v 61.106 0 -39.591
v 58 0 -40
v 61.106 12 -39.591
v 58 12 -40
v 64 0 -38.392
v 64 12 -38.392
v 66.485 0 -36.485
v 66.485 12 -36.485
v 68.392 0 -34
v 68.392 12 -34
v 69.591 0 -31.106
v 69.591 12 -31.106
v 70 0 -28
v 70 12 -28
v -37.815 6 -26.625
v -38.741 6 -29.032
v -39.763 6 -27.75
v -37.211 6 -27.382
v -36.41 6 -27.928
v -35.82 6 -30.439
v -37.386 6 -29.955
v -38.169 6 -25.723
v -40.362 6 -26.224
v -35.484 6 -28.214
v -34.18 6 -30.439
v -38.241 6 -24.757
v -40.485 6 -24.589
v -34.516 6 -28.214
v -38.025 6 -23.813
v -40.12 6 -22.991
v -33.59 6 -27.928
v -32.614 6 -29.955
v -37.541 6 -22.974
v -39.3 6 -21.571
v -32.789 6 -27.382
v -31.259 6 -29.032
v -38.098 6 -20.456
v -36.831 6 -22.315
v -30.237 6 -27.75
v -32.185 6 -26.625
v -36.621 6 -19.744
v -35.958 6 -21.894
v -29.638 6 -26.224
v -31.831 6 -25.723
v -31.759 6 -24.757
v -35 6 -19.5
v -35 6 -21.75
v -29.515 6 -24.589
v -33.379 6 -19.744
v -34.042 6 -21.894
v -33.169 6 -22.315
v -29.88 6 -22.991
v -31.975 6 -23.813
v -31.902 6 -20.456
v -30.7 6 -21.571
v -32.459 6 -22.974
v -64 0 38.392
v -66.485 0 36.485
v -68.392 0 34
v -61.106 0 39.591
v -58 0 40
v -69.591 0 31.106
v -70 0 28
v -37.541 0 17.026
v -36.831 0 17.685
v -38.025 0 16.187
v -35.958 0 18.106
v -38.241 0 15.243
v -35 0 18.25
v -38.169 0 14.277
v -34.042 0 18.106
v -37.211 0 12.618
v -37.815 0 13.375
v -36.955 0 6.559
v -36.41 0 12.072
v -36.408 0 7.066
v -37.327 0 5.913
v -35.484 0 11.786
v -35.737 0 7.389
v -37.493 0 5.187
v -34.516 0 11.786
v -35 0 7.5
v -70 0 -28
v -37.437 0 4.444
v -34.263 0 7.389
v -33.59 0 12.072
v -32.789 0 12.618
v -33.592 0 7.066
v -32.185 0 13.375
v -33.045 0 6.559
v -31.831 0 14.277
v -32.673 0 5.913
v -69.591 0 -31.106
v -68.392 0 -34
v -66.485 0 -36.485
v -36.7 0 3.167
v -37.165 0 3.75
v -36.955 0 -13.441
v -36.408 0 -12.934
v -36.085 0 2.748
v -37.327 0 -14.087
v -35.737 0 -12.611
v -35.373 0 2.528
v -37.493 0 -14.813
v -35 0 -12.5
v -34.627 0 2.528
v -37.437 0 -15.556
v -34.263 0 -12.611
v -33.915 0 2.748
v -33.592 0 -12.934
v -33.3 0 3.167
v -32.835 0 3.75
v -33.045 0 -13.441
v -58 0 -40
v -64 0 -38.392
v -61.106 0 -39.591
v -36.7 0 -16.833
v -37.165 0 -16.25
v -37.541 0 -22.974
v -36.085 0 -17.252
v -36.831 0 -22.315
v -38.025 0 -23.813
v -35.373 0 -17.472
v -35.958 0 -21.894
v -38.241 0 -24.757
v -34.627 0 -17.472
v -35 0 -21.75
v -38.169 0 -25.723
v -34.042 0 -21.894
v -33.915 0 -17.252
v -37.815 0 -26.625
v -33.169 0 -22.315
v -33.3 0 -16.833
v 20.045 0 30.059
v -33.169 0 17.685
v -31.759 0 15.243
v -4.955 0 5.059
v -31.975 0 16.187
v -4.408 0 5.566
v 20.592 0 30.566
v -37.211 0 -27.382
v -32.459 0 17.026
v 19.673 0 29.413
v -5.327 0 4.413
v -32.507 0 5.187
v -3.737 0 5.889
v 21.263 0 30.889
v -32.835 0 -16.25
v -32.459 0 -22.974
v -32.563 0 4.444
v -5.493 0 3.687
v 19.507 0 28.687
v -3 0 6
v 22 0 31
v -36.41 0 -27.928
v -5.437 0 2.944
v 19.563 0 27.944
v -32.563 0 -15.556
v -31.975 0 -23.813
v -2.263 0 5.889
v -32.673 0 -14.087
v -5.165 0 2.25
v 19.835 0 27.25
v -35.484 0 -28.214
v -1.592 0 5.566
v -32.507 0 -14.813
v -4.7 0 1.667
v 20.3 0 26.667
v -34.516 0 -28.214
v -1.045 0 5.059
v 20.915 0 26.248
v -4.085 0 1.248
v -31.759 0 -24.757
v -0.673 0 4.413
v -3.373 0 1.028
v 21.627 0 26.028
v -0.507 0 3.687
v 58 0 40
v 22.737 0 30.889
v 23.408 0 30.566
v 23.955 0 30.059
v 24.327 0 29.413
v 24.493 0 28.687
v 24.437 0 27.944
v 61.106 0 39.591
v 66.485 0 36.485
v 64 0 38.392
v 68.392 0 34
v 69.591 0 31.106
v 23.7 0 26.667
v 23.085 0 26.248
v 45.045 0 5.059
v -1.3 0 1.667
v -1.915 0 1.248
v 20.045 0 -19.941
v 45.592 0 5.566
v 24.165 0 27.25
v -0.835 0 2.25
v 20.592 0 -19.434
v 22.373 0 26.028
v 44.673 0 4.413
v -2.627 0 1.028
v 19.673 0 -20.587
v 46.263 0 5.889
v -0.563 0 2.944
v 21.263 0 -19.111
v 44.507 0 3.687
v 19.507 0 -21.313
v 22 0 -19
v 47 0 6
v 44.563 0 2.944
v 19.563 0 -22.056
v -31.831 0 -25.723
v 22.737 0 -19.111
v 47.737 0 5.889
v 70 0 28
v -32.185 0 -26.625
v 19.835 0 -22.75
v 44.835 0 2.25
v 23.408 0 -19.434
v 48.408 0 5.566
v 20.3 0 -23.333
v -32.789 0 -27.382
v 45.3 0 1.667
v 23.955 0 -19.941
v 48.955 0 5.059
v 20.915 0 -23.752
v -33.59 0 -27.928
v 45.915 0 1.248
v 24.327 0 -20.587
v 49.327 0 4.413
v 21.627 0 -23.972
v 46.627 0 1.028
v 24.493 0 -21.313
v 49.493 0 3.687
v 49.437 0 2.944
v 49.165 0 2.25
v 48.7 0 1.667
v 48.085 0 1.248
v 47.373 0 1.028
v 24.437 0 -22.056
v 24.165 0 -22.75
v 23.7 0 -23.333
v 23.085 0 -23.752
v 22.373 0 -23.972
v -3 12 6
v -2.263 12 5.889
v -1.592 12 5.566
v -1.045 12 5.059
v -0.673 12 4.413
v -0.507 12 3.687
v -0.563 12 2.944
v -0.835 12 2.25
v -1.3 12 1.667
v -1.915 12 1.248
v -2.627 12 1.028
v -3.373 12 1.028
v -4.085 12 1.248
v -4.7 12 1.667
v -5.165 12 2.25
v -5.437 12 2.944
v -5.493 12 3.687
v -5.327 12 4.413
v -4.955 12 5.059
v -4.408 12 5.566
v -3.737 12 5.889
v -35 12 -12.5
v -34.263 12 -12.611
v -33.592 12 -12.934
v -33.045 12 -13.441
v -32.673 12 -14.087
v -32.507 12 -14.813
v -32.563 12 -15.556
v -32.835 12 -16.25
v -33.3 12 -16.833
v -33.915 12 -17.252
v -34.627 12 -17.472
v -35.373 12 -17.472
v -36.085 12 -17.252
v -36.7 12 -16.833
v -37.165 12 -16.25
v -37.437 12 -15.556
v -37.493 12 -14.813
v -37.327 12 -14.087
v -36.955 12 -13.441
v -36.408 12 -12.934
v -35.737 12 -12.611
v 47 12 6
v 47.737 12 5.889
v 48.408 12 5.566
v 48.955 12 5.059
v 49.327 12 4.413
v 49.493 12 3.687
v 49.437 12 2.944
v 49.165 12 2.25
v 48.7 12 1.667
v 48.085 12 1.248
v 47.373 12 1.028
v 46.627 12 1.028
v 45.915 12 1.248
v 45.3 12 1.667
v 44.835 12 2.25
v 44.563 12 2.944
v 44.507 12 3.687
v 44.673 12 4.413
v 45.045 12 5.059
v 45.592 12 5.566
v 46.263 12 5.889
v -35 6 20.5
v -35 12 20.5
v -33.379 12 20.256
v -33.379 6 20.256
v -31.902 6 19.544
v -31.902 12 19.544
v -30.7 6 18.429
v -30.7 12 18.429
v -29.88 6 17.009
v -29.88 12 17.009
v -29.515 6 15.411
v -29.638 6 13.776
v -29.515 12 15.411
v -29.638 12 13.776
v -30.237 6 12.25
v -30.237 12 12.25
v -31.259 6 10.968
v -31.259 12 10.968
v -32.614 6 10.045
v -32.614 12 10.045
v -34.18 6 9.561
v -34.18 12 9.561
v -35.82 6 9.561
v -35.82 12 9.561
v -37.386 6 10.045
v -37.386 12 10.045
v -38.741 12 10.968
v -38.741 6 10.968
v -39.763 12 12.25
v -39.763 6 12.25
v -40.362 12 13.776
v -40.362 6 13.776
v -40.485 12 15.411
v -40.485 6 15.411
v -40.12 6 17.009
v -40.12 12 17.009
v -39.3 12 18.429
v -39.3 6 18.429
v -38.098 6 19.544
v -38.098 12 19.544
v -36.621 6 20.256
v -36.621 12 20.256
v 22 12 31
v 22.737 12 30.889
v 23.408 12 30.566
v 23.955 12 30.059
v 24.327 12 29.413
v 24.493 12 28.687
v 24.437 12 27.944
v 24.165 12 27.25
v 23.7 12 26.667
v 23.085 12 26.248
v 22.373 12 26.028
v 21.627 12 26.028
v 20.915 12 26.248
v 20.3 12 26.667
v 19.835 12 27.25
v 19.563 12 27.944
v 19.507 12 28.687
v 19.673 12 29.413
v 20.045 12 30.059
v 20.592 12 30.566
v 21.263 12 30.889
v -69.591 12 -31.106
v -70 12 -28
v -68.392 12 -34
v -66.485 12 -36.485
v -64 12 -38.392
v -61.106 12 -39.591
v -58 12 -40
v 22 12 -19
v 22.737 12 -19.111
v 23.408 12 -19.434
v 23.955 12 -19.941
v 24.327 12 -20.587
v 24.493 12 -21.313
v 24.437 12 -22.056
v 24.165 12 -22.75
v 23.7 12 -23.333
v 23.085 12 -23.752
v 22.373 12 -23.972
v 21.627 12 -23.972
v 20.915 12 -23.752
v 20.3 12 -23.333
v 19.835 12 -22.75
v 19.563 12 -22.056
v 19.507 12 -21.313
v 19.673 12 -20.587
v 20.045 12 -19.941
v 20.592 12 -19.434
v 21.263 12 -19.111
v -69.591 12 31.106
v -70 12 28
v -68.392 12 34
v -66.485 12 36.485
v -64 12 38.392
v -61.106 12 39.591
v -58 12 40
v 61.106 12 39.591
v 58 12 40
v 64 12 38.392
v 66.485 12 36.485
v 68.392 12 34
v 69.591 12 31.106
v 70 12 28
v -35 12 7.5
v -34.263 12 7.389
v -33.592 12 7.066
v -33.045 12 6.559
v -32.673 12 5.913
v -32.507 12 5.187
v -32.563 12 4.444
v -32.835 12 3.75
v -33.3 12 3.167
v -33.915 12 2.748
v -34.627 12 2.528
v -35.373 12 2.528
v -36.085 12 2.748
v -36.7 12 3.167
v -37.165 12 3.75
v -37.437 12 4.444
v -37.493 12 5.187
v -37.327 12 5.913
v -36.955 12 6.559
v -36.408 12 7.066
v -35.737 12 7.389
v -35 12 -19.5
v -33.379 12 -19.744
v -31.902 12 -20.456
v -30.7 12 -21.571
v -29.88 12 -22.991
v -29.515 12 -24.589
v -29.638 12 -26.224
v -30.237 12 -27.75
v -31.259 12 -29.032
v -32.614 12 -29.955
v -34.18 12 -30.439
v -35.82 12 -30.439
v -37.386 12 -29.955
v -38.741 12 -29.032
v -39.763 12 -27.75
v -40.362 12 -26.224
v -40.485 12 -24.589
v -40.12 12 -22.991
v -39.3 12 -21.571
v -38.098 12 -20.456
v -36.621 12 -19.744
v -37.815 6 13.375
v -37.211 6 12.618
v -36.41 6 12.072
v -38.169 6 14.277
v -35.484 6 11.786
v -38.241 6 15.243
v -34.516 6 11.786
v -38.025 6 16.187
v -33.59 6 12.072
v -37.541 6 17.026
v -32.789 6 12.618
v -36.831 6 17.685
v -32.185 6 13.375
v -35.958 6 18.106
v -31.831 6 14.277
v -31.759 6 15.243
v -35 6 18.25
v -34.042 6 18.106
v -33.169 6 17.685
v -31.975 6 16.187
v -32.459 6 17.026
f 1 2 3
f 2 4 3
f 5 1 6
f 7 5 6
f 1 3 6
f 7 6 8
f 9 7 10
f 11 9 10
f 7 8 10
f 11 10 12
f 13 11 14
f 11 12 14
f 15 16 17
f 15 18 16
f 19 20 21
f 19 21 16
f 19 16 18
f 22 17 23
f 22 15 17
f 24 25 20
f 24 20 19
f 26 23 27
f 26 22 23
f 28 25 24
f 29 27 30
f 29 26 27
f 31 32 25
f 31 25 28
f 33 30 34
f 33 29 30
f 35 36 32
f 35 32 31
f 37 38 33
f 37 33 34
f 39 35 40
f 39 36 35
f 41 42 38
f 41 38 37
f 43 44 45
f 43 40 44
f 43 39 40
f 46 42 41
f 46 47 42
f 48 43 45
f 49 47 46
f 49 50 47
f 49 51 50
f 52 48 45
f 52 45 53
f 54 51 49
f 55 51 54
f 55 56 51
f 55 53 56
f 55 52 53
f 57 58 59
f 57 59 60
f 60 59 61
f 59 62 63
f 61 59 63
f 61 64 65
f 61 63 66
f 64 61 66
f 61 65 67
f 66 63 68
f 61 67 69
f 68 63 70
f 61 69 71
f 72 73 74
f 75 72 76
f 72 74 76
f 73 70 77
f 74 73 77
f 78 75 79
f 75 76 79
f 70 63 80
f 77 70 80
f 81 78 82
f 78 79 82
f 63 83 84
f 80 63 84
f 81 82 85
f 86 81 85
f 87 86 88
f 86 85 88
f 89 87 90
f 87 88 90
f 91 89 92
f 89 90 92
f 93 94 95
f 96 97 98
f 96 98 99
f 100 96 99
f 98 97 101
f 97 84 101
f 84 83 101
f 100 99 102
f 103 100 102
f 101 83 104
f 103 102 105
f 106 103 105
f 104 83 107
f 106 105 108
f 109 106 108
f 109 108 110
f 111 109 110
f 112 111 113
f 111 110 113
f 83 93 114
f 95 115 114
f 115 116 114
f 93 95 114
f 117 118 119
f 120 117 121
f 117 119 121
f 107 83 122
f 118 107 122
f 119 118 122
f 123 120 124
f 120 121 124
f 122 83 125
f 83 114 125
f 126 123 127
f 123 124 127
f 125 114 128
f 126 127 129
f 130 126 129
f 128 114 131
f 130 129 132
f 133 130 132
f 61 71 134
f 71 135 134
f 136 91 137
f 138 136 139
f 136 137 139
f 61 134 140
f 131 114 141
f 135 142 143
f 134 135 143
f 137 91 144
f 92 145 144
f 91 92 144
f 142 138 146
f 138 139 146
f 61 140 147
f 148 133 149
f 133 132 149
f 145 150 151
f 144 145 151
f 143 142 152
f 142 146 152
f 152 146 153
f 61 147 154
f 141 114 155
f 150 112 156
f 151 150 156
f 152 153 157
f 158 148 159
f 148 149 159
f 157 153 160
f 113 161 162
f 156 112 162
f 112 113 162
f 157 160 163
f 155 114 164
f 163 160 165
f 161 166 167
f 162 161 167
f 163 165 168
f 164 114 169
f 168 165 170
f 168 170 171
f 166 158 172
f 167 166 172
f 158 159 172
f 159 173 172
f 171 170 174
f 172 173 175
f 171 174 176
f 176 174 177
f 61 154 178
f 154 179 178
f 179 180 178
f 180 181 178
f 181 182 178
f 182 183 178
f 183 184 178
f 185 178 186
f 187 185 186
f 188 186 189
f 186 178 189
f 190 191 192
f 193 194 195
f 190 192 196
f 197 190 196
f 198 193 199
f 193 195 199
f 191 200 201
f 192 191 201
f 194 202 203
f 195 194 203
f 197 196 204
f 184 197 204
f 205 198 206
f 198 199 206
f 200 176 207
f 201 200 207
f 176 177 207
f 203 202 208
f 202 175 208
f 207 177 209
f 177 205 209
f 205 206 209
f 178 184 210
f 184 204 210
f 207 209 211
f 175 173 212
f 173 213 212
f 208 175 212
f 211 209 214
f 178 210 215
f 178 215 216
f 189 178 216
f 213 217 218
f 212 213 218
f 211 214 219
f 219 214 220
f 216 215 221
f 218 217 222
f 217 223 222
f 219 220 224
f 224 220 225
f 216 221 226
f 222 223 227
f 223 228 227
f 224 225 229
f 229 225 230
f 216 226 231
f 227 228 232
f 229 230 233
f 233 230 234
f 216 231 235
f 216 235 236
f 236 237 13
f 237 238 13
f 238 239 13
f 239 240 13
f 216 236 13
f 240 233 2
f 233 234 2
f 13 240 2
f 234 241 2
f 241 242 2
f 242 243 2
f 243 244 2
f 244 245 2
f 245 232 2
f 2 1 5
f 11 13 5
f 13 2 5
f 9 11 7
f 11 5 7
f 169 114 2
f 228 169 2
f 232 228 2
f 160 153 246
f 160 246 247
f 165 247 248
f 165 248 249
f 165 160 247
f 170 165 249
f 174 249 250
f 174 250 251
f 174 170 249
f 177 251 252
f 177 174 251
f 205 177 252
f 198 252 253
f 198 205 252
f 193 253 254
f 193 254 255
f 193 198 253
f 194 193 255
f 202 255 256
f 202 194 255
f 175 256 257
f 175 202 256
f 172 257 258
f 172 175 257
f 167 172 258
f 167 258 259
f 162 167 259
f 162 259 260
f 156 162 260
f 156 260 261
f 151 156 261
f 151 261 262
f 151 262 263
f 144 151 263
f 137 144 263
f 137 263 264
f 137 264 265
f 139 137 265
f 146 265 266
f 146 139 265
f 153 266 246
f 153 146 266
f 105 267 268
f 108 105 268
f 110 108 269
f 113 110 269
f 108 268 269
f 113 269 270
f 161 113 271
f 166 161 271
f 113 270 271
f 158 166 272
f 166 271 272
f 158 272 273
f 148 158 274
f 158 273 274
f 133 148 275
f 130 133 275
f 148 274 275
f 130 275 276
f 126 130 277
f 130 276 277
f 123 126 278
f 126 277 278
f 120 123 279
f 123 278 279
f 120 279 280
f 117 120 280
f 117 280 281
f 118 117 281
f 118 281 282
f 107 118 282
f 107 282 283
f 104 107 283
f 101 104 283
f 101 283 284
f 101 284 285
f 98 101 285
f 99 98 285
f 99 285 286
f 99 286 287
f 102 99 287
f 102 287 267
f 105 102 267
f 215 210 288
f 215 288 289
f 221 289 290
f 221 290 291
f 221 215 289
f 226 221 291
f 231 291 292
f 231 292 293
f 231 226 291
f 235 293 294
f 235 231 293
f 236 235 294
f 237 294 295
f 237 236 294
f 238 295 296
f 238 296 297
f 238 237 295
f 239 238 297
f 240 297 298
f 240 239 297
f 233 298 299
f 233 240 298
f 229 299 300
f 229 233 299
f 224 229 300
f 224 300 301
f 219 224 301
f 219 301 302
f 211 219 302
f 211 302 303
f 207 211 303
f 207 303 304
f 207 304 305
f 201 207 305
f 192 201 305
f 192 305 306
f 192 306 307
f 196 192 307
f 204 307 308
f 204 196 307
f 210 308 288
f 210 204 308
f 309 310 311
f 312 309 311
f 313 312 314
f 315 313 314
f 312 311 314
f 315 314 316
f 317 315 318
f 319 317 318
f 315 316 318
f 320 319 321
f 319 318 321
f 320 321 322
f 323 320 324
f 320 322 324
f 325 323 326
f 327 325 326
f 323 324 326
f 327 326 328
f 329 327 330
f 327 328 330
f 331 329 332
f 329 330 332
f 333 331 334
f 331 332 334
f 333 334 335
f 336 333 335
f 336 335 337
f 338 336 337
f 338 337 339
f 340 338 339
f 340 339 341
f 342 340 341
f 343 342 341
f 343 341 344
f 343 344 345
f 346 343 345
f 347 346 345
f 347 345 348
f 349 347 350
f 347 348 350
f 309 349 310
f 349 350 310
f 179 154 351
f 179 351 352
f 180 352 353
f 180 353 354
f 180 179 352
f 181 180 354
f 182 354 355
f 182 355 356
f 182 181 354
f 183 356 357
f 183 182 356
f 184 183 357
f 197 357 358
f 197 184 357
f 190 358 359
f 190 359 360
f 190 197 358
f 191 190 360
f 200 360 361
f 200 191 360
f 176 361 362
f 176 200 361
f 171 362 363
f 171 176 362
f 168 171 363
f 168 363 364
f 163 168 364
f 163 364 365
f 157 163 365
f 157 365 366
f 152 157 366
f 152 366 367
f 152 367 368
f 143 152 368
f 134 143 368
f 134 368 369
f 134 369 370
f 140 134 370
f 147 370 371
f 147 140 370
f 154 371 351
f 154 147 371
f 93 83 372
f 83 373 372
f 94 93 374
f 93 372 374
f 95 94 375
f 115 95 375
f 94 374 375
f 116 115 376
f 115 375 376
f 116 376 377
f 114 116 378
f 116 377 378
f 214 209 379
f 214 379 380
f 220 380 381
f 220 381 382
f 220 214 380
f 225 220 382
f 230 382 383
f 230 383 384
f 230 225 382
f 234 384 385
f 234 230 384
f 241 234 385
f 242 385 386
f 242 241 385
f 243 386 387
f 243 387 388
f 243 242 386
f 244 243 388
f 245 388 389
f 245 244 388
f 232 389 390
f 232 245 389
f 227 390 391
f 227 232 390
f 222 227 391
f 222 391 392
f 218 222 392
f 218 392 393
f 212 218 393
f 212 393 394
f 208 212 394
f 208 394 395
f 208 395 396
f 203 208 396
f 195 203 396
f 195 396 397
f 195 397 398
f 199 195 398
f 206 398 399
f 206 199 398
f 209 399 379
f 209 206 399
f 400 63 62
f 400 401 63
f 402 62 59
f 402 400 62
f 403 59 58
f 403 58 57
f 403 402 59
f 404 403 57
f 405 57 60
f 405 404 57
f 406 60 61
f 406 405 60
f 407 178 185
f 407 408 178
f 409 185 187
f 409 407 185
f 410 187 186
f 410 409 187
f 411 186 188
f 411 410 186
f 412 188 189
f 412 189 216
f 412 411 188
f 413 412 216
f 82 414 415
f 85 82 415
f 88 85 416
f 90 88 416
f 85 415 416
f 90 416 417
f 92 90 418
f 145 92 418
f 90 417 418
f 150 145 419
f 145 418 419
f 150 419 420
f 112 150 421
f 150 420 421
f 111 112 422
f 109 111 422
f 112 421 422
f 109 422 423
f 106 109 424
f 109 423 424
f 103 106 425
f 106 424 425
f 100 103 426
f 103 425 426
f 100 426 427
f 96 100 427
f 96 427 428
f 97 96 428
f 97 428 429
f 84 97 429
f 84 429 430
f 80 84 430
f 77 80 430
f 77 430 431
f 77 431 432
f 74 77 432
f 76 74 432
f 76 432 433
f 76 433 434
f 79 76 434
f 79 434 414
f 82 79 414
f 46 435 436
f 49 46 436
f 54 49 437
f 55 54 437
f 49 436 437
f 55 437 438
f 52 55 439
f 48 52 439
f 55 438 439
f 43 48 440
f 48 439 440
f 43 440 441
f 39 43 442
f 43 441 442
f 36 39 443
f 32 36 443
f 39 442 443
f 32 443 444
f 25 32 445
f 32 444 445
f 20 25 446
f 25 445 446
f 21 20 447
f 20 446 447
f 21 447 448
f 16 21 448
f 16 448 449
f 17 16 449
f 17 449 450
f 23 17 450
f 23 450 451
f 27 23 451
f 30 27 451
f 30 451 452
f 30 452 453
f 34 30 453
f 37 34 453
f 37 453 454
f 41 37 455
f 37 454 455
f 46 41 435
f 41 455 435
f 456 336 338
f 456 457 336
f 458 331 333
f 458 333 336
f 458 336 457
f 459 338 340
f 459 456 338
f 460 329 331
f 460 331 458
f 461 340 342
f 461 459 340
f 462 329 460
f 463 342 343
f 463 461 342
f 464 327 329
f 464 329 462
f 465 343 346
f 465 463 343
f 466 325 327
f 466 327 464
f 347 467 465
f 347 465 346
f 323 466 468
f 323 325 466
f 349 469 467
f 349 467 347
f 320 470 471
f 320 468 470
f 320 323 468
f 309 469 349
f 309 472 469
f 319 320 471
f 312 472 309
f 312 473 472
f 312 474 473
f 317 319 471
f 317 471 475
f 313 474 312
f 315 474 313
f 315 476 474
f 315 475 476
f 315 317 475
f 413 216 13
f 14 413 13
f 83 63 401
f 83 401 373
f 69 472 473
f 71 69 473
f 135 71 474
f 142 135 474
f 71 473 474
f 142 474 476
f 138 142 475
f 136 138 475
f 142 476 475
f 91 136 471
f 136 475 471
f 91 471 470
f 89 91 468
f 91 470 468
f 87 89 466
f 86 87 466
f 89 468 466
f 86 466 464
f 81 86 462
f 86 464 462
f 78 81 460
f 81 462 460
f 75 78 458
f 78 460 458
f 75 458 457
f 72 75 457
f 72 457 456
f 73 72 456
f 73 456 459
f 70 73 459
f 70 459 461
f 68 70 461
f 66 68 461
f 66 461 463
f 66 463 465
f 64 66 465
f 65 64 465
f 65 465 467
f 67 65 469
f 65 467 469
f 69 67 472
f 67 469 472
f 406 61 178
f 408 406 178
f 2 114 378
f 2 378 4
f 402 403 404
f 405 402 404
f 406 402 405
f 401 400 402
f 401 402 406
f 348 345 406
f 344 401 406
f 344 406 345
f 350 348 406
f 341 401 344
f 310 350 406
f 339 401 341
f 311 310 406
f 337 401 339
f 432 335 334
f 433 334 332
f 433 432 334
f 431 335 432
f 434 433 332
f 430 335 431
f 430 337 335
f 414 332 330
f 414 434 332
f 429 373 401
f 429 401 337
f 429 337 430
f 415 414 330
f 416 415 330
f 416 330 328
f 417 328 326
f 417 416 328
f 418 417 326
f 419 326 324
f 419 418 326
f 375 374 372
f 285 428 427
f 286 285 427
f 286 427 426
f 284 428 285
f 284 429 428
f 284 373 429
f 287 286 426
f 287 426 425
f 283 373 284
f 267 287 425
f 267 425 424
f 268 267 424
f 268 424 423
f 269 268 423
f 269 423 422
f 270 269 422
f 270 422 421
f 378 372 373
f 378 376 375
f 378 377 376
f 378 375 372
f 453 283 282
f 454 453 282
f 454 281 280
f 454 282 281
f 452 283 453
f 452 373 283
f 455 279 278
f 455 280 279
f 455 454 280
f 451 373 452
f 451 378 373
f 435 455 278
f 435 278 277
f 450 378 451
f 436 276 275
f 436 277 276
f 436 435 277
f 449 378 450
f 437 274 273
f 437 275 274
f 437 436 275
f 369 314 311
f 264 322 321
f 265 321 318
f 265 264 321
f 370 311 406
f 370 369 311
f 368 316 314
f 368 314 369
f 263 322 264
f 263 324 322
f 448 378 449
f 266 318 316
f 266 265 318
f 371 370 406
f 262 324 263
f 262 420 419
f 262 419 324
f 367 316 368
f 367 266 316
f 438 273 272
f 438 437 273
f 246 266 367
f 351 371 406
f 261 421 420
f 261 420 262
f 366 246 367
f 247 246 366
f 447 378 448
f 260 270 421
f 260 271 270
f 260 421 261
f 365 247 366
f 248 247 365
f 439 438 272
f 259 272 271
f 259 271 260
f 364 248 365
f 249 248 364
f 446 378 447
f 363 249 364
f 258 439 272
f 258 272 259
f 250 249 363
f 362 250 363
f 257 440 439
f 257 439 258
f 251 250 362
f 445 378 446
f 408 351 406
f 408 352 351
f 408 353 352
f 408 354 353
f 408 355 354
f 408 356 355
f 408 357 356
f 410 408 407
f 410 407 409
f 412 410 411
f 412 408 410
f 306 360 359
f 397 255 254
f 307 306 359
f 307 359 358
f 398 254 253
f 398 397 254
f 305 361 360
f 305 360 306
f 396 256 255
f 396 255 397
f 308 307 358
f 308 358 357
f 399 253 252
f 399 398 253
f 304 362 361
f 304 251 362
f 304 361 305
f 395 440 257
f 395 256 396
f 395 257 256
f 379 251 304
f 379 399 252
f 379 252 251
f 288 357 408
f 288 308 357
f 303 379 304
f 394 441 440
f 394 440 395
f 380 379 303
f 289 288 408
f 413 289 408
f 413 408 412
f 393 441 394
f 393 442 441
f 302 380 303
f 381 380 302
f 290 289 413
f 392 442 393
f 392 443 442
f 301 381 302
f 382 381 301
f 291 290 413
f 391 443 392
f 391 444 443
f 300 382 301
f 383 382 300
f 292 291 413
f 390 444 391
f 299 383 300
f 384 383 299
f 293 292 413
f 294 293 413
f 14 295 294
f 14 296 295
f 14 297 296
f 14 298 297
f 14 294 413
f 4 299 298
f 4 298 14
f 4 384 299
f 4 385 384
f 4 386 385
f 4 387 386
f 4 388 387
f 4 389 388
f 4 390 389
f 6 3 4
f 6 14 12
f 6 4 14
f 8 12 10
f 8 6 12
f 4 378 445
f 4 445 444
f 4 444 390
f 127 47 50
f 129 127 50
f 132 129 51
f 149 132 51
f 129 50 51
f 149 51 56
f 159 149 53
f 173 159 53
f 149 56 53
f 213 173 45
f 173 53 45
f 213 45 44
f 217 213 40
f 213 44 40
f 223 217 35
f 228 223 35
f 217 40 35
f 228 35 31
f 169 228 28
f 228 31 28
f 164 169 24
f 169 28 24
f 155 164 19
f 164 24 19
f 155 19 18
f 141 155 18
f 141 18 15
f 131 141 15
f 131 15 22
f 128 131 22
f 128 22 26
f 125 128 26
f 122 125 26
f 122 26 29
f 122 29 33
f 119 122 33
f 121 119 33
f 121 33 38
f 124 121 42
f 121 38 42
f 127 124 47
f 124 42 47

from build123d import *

# Parameters (mm, degrees)
SKETCH1_W           = 140
SKETCH1_H           = 80
SKETCH1_R           = 2.5
BOSS_EXTRUDE1_DEPTH = 12
FILLET1_R           = 12
SKETCH2_R           = 5.5
CUT_EXTRUDE1_DEPTH  = 6
SKETCH4_R           = 3.25
CUT_EXTRUDE2_DEPTH  = 6
SKETCH5_R           = 2.5
CUT_EXTRUDE3_DEPTH  = 82.510735489


with BuildPart() as part:
    # Sketch1 → Boss-Extrude1 (new body)
    with BuildSketch(Plane(origin=(0, 0, 0), x_dir=(1, 0, 0), z_dir=(0, 1, 0))):
        Rectangle(SKETCH1_W, SKETCH1_H)
        with Locations(Location((22, 21.5, 0), (0, 0, 270))):
            Circle(SKETCH1_R, mode=Mode.SUBTRACT)
        with Locations(Location((47, -3.5, 0), (0, 0, 270))):
            Circle(SKETCH1_R, mode=Mode.SUBTRACT)
        with Locations(Location((-3, -3.5, 0), (0, 0, 270))):
            Circle(SKETCH1_R, mode=Mode.SUBTRACT)
        with Locations(Location((22, -28.5, 0), (0, 0, 270))):
            Circle(SKETCH1_R, mode=Mode.SUBTRACT)
    extrude(amount=BOSS_EXTRUDE1_DEPTH)

    # Fillet1
    fillet1_edges = [part.edges().sort_by_distance(p)[0] for p in [
        (70, 6, 40),
        (-70, 6, 40),
        (-70, 6, -40),
        (70, 6, -40),
    ]]
    fillet(fillet1_edges, radius=FILLET1_R)

    # Sketch2 → Cut-Extrude1 (cut)
    with BuildSketch(Plane(origin=(0, 12, 0), x_dir=(1, 0, 0), z_dir=(0, 1, 0))):
        with Locations(Location((-35, 25, 0), (0, 0, 270))):
            Circle(SKETCH2_R)
        with Locations(Location((-35, -15, 0), (0, 0, 270))):
            Circle(SKETCH2_R)
    extrude(amount=-CUT_EXTRUDE1_DEPTH, mode=Mode.SUBTRACT)

    # Sketch4 → Cut-Extrude2 (cut)
    with BuildSketch(Plane(origin=(0, 6, 0), x_dir=(1, 0, 0), z_dir=(0, 1, 0))):
        with Locations(Location((-35, 25, 0), (0, 0, 270))):
            Circle(SKETCH4_R)
        with Locations(Location((-35, -15, 0), (0, 0, 270))):
            Circle(SKETCH4_R)
    extrude(amount=-CUT_EXTRUDE2_DEPTH, mode=Mode.SUBTRACT)

    # Sketch5 → Cut-Extrude3 (cut, through all)
    with BuildSketch(Plane(origin=(0, 12, 0), x_dir=(1, 0, 0), z_dir=(0, 1, 0))):
        with Locations(Location((-35, 15, 0), (0, 0, 270))):
            Circle(SKETCH5_R)
        with Locations(Location((-35, -5, 0), (0, 0, 270))):
            Circle(SKETCH5_R)
    extrude(amount=-CUT_EXTRUDE3_DEPTH, mode=Mode.SUBTRACT)


solid = part.part
